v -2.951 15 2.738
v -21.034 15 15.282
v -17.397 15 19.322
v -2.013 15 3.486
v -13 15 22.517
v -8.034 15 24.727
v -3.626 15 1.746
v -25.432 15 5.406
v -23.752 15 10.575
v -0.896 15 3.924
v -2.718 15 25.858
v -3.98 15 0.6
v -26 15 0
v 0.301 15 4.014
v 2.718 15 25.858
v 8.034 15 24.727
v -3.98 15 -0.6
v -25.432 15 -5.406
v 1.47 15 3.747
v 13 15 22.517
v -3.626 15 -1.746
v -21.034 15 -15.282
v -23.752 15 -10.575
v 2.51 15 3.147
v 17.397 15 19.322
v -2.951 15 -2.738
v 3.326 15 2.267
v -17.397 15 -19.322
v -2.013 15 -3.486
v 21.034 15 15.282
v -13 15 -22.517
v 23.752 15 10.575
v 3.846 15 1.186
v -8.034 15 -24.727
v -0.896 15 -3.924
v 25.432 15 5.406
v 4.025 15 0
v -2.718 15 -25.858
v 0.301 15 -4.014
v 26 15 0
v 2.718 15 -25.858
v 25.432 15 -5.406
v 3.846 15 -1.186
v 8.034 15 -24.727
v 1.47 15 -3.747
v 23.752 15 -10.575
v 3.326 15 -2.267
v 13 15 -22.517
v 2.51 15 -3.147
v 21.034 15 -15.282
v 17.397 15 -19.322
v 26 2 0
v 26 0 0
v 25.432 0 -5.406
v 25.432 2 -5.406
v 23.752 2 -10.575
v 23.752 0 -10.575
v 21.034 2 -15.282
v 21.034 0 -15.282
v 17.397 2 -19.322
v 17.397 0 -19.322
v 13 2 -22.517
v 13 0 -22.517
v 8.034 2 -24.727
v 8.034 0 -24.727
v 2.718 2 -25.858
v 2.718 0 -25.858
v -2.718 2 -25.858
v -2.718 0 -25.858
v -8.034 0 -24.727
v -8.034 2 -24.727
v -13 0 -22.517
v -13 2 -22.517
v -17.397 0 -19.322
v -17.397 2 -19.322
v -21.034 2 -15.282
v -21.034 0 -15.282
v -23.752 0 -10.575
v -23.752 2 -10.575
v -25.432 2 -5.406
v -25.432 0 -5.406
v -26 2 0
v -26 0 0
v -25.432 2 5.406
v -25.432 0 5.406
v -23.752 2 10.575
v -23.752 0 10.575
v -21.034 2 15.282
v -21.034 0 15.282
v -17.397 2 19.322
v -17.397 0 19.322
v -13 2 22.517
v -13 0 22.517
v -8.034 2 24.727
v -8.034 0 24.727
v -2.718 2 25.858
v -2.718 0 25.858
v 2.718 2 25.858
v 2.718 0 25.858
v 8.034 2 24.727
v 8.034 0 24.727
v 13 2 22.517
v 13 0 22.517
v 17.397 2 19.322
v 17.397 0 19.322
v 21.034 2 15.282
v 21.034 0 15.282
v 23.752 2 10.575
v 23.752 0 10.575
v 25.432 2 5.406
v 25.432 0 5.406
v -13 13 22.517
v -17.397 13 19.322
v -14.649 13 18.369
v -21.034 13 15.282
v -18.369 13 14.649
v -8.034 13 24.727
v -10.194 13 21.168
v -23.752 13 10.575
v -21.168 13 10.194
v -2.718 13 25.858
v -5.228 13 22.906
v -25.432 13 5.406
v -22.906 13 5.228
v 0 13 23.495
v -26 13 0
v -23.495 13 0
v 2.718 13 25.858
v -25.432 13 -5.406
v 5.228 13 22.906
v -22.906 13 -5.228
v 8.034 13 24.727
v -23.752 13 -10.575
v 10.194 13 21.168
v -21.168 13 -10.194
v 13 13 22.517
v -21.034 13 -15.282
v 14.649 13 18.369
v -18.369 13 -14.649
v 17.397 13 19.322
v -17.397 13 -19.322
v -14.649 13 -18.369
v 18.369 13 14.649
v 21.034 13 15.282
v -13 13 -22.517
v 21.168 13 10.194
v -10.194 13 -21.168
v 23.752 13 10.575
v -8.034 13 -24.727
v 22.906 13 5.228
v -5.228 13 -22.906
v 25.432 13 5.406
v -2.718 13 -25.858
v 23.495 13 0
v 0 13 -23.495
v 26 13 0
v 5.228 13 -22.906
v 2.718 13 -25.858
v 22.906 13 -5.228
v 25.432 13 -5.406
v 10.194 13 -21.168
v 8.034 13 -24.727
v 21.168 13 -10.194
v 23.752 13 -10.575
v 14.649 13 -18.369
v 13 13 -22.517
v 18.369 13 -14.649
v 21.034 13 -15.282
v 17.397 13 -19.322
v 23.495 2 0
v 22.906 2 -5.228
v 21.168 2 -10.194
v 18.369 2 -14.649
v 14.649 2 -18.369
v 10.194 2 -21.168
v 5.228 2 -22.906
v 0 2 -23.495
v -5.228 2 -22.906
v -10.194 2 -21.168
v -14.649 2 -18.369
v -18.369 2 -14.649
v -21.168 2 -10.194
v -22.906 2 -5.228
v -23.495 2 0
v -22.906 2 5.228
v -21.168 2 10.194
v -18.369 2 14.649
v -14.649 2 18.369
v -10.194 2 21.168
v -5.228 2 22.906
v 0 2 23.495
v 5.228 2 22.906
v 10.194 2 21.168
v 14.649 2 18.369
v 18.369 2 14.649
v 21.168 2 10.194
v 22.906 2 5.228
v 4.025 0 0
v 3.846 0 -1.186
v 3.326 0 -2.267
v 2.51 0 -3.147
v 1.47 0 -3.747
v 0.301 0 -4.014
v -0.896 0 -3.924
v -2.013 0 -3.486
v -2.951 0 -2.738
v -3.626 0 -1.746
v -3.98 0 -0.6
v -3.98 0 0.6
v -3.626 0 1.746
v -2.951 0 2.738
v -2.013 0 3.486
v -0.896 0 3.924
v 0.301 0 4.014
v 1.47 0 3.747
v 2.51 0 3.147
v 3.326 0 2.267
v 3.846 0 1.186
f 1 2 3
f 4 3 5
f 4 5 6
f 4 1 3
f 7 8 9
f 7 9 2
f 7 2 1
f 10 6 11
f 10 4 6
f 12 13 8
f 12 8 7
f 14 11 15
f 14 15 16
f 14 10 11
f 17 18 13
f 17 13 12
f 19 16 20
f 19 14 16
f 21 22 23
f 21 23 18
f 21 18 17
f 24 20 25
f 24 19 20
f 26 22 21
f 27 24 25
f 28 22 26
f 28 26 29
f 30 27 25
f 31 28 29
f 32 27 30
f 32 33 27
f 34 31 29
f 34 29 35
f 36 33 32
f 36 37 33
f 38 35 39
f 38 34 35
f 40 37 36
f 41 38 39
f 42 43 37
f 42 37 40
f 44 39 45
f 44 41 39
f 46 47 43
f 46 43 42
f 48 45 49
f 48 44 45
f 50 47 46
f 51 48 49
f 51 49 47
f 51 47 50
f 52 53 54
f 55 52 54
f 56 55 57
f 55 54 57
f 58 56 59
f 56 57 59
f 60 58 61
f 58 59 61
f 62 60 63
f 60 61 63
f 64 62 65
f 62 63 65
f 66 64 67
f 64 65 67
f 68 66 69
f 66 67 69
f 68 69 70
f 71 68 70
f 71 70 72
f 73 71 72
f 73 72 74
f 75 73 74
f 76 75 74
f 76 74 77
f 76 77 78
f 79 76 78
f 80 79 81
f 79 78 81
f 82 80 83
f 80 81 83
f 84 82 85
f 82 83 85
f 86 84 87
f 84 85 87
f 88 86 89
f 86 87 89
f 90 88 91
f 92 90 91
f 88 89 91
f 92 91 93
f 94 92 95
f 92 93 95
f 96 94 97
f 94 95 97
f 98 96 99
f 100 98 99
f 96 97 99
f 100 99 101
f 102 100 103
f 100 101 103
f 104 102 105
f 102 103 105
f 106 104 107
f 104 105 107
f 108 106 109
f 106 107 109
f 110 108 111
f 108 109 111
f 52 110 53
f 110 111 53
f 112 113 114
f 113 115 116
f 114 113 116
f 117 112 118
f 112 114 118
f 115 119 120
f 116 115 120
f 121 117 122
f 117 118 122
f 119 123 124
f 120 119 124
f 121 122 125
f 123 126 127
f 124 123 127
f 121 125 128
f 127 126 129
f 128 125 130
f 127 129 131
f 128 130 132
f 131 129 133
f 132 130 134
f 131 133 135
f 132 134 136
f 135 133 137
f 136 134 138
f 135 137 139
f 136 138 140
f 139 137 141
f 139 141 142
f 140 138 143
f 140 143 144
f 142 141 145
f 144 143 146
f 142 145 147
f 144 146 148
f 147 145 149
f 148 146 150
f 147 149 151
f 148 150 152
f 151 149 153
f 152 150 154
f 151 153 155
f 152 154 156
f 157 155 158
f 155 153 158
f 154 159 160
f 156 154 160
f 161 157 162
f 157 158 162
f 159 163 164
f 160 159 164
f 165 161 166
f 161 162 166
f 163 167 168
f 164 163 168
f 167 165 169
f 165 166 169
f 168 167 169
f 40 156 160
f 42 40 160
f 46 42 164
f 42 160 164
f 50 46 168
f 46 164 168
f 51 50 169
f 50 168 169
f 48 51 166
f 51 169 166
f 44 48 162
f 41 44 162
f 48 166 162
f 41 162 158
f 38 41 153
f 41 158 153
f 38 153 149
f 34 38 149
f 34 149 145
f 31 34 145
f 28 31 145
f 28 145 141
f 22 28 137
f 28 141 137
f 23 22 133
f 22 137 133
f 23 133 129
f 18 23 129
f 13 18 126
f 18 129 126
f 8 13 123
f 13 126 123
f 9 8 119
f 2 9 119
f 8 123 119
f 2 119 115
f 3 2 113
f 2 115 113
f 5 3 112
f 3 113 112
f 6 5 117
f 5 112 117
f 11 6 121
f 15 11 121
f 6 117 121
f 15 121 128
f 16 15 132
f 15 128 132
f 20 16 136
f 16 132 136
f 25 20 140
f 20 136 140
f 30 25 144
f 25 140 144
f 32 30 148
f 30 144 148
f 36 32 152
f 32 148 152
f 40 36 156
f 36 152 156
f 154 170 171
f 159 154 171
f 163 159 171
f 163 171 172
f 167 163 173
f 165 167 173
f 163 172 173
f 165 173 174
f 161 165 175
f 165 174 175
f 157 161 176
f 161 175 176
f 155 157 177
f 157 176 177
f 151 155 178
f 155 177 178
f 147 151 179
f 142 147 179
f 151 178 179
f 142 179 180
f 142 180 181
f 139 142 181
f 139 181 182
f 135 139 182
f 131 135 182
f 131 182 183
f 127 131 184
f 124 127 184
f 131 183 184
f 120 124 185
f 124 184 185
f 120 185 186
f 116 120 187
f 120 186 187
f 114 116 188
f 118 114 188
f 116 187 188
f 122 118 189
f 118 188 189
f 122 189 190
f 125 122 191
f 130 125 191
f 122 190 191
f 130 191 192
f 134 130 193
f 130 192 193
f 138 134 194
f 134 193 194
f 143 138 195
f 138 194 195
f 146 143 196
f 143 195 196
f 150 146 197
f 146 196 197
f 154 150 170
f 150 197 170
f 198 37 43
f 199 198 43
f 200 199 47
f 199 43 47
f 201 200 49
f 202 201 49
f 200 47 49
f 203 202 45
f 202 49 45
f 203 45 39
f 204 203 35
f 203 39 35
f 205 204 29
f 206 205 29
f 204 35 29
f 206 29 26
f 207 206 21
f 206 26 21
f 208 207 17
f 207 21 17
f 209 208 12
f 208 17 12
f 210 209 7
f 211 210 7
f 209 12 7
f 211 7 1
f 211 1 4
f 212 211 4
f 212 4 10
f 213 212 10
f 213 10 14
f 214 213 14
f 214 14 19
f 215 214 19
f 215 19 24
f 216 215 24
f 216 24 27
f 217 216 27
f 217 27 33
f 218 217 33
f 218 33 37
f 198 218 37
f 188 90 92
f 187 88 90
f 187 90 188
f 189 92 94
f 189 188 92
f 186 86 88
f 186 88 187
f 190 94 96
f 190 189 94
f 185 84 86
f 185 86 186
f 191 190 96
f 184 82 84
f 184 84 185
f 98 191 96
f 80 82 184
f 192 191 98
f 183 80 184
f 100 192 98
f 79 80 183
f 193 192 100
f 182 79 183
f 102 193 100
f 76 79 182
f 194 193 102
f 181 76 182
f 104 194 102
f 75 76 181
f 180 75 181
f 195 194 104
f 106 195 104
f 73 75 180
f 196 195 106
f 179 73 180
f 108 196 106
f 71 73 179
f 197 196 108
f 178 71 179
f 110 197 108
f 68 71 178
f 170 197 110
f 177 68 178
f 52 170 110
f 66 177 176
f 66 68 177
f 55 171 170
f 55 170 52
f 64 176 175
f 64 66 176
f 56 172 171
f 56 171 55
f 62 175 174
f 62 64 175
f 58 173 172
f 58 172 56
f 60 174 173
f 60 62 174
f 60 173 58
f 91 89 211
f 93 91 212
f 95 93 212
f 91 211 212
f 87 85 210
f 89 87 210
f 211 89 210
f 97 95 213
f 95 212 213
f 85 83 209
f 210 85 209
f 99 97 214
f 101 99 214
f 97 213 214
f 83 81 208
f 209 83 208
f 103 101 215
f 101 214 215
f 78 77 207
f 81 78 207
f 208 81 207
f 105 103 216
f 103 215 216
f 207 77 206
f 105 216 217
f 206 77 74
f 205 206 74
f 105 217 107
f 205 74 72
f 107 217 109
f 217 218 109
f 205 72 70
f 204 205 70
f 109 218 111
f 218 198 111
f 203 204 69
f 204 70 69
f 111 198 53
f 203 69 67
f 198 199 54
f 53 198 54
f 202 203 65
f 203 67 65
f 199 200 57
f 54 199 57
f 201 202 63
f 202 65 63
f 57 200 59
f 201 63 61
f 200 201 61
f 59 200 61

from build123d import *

# Parameters (mm, degrees)
SKETCH_1_R          = 26
EXTRUDE_1_DEPTH     = 2
SKETCH_2_R          = 23.495
EXTRUDE_2_DEPTH     = 11
SKETCH_3_R          = 26
EXTRUDE_3_DEPTH     = 2
SKETCH_4_R          = 4.025
CUT_EXTRUDE_1_DEPTH = 16


with BuildPart() as part:
    # 草图1 → 凸台-拉伸1 (new body)
    with BuildSketch(Plane(origin=(0, 0, 0), x_dir=(1, 0, 0), z_dir=(0, 1, 0))):
        Circle(SKETCH_1_R)
    extrude(amount=EXTRUDE_1_DEPTH)

    # 草图2 → 凸台-拉伸2 (add)
    with BuildSketch(Plane(origin=(0, 2, 0), x_dir=(1, 0, 0), z_dir=(0, 1, 0))):
        Circle(SKETCH_2_R)
    extrude(amount=EXTRUDE_2_DEPTH)

    # 草图3 → 凸台-拉伸3 (add)
    with BuildSketch(Plane(origin=(0, 13, 0), x_dir=(1, 0, 0), z_dir=(0, 1, 0))):
        Circle(SKETCH_3_R)
    extrude(amount=EXTRUDE_3_DEPTH)

    # 草图4 → 切除-拉伸1 (cut, through all)
    with BuildSketch(Plane(origin=(0, 15, 0), x_dir=(1, 0, 0), z_dir=(0, 1, 0))):
        Circle(SKETCH_4_R)
    extrude(amount=-CUT_EXTRUDE_1_DEPTH, mode=Mode.SUBTRACT)


solid = part.part
